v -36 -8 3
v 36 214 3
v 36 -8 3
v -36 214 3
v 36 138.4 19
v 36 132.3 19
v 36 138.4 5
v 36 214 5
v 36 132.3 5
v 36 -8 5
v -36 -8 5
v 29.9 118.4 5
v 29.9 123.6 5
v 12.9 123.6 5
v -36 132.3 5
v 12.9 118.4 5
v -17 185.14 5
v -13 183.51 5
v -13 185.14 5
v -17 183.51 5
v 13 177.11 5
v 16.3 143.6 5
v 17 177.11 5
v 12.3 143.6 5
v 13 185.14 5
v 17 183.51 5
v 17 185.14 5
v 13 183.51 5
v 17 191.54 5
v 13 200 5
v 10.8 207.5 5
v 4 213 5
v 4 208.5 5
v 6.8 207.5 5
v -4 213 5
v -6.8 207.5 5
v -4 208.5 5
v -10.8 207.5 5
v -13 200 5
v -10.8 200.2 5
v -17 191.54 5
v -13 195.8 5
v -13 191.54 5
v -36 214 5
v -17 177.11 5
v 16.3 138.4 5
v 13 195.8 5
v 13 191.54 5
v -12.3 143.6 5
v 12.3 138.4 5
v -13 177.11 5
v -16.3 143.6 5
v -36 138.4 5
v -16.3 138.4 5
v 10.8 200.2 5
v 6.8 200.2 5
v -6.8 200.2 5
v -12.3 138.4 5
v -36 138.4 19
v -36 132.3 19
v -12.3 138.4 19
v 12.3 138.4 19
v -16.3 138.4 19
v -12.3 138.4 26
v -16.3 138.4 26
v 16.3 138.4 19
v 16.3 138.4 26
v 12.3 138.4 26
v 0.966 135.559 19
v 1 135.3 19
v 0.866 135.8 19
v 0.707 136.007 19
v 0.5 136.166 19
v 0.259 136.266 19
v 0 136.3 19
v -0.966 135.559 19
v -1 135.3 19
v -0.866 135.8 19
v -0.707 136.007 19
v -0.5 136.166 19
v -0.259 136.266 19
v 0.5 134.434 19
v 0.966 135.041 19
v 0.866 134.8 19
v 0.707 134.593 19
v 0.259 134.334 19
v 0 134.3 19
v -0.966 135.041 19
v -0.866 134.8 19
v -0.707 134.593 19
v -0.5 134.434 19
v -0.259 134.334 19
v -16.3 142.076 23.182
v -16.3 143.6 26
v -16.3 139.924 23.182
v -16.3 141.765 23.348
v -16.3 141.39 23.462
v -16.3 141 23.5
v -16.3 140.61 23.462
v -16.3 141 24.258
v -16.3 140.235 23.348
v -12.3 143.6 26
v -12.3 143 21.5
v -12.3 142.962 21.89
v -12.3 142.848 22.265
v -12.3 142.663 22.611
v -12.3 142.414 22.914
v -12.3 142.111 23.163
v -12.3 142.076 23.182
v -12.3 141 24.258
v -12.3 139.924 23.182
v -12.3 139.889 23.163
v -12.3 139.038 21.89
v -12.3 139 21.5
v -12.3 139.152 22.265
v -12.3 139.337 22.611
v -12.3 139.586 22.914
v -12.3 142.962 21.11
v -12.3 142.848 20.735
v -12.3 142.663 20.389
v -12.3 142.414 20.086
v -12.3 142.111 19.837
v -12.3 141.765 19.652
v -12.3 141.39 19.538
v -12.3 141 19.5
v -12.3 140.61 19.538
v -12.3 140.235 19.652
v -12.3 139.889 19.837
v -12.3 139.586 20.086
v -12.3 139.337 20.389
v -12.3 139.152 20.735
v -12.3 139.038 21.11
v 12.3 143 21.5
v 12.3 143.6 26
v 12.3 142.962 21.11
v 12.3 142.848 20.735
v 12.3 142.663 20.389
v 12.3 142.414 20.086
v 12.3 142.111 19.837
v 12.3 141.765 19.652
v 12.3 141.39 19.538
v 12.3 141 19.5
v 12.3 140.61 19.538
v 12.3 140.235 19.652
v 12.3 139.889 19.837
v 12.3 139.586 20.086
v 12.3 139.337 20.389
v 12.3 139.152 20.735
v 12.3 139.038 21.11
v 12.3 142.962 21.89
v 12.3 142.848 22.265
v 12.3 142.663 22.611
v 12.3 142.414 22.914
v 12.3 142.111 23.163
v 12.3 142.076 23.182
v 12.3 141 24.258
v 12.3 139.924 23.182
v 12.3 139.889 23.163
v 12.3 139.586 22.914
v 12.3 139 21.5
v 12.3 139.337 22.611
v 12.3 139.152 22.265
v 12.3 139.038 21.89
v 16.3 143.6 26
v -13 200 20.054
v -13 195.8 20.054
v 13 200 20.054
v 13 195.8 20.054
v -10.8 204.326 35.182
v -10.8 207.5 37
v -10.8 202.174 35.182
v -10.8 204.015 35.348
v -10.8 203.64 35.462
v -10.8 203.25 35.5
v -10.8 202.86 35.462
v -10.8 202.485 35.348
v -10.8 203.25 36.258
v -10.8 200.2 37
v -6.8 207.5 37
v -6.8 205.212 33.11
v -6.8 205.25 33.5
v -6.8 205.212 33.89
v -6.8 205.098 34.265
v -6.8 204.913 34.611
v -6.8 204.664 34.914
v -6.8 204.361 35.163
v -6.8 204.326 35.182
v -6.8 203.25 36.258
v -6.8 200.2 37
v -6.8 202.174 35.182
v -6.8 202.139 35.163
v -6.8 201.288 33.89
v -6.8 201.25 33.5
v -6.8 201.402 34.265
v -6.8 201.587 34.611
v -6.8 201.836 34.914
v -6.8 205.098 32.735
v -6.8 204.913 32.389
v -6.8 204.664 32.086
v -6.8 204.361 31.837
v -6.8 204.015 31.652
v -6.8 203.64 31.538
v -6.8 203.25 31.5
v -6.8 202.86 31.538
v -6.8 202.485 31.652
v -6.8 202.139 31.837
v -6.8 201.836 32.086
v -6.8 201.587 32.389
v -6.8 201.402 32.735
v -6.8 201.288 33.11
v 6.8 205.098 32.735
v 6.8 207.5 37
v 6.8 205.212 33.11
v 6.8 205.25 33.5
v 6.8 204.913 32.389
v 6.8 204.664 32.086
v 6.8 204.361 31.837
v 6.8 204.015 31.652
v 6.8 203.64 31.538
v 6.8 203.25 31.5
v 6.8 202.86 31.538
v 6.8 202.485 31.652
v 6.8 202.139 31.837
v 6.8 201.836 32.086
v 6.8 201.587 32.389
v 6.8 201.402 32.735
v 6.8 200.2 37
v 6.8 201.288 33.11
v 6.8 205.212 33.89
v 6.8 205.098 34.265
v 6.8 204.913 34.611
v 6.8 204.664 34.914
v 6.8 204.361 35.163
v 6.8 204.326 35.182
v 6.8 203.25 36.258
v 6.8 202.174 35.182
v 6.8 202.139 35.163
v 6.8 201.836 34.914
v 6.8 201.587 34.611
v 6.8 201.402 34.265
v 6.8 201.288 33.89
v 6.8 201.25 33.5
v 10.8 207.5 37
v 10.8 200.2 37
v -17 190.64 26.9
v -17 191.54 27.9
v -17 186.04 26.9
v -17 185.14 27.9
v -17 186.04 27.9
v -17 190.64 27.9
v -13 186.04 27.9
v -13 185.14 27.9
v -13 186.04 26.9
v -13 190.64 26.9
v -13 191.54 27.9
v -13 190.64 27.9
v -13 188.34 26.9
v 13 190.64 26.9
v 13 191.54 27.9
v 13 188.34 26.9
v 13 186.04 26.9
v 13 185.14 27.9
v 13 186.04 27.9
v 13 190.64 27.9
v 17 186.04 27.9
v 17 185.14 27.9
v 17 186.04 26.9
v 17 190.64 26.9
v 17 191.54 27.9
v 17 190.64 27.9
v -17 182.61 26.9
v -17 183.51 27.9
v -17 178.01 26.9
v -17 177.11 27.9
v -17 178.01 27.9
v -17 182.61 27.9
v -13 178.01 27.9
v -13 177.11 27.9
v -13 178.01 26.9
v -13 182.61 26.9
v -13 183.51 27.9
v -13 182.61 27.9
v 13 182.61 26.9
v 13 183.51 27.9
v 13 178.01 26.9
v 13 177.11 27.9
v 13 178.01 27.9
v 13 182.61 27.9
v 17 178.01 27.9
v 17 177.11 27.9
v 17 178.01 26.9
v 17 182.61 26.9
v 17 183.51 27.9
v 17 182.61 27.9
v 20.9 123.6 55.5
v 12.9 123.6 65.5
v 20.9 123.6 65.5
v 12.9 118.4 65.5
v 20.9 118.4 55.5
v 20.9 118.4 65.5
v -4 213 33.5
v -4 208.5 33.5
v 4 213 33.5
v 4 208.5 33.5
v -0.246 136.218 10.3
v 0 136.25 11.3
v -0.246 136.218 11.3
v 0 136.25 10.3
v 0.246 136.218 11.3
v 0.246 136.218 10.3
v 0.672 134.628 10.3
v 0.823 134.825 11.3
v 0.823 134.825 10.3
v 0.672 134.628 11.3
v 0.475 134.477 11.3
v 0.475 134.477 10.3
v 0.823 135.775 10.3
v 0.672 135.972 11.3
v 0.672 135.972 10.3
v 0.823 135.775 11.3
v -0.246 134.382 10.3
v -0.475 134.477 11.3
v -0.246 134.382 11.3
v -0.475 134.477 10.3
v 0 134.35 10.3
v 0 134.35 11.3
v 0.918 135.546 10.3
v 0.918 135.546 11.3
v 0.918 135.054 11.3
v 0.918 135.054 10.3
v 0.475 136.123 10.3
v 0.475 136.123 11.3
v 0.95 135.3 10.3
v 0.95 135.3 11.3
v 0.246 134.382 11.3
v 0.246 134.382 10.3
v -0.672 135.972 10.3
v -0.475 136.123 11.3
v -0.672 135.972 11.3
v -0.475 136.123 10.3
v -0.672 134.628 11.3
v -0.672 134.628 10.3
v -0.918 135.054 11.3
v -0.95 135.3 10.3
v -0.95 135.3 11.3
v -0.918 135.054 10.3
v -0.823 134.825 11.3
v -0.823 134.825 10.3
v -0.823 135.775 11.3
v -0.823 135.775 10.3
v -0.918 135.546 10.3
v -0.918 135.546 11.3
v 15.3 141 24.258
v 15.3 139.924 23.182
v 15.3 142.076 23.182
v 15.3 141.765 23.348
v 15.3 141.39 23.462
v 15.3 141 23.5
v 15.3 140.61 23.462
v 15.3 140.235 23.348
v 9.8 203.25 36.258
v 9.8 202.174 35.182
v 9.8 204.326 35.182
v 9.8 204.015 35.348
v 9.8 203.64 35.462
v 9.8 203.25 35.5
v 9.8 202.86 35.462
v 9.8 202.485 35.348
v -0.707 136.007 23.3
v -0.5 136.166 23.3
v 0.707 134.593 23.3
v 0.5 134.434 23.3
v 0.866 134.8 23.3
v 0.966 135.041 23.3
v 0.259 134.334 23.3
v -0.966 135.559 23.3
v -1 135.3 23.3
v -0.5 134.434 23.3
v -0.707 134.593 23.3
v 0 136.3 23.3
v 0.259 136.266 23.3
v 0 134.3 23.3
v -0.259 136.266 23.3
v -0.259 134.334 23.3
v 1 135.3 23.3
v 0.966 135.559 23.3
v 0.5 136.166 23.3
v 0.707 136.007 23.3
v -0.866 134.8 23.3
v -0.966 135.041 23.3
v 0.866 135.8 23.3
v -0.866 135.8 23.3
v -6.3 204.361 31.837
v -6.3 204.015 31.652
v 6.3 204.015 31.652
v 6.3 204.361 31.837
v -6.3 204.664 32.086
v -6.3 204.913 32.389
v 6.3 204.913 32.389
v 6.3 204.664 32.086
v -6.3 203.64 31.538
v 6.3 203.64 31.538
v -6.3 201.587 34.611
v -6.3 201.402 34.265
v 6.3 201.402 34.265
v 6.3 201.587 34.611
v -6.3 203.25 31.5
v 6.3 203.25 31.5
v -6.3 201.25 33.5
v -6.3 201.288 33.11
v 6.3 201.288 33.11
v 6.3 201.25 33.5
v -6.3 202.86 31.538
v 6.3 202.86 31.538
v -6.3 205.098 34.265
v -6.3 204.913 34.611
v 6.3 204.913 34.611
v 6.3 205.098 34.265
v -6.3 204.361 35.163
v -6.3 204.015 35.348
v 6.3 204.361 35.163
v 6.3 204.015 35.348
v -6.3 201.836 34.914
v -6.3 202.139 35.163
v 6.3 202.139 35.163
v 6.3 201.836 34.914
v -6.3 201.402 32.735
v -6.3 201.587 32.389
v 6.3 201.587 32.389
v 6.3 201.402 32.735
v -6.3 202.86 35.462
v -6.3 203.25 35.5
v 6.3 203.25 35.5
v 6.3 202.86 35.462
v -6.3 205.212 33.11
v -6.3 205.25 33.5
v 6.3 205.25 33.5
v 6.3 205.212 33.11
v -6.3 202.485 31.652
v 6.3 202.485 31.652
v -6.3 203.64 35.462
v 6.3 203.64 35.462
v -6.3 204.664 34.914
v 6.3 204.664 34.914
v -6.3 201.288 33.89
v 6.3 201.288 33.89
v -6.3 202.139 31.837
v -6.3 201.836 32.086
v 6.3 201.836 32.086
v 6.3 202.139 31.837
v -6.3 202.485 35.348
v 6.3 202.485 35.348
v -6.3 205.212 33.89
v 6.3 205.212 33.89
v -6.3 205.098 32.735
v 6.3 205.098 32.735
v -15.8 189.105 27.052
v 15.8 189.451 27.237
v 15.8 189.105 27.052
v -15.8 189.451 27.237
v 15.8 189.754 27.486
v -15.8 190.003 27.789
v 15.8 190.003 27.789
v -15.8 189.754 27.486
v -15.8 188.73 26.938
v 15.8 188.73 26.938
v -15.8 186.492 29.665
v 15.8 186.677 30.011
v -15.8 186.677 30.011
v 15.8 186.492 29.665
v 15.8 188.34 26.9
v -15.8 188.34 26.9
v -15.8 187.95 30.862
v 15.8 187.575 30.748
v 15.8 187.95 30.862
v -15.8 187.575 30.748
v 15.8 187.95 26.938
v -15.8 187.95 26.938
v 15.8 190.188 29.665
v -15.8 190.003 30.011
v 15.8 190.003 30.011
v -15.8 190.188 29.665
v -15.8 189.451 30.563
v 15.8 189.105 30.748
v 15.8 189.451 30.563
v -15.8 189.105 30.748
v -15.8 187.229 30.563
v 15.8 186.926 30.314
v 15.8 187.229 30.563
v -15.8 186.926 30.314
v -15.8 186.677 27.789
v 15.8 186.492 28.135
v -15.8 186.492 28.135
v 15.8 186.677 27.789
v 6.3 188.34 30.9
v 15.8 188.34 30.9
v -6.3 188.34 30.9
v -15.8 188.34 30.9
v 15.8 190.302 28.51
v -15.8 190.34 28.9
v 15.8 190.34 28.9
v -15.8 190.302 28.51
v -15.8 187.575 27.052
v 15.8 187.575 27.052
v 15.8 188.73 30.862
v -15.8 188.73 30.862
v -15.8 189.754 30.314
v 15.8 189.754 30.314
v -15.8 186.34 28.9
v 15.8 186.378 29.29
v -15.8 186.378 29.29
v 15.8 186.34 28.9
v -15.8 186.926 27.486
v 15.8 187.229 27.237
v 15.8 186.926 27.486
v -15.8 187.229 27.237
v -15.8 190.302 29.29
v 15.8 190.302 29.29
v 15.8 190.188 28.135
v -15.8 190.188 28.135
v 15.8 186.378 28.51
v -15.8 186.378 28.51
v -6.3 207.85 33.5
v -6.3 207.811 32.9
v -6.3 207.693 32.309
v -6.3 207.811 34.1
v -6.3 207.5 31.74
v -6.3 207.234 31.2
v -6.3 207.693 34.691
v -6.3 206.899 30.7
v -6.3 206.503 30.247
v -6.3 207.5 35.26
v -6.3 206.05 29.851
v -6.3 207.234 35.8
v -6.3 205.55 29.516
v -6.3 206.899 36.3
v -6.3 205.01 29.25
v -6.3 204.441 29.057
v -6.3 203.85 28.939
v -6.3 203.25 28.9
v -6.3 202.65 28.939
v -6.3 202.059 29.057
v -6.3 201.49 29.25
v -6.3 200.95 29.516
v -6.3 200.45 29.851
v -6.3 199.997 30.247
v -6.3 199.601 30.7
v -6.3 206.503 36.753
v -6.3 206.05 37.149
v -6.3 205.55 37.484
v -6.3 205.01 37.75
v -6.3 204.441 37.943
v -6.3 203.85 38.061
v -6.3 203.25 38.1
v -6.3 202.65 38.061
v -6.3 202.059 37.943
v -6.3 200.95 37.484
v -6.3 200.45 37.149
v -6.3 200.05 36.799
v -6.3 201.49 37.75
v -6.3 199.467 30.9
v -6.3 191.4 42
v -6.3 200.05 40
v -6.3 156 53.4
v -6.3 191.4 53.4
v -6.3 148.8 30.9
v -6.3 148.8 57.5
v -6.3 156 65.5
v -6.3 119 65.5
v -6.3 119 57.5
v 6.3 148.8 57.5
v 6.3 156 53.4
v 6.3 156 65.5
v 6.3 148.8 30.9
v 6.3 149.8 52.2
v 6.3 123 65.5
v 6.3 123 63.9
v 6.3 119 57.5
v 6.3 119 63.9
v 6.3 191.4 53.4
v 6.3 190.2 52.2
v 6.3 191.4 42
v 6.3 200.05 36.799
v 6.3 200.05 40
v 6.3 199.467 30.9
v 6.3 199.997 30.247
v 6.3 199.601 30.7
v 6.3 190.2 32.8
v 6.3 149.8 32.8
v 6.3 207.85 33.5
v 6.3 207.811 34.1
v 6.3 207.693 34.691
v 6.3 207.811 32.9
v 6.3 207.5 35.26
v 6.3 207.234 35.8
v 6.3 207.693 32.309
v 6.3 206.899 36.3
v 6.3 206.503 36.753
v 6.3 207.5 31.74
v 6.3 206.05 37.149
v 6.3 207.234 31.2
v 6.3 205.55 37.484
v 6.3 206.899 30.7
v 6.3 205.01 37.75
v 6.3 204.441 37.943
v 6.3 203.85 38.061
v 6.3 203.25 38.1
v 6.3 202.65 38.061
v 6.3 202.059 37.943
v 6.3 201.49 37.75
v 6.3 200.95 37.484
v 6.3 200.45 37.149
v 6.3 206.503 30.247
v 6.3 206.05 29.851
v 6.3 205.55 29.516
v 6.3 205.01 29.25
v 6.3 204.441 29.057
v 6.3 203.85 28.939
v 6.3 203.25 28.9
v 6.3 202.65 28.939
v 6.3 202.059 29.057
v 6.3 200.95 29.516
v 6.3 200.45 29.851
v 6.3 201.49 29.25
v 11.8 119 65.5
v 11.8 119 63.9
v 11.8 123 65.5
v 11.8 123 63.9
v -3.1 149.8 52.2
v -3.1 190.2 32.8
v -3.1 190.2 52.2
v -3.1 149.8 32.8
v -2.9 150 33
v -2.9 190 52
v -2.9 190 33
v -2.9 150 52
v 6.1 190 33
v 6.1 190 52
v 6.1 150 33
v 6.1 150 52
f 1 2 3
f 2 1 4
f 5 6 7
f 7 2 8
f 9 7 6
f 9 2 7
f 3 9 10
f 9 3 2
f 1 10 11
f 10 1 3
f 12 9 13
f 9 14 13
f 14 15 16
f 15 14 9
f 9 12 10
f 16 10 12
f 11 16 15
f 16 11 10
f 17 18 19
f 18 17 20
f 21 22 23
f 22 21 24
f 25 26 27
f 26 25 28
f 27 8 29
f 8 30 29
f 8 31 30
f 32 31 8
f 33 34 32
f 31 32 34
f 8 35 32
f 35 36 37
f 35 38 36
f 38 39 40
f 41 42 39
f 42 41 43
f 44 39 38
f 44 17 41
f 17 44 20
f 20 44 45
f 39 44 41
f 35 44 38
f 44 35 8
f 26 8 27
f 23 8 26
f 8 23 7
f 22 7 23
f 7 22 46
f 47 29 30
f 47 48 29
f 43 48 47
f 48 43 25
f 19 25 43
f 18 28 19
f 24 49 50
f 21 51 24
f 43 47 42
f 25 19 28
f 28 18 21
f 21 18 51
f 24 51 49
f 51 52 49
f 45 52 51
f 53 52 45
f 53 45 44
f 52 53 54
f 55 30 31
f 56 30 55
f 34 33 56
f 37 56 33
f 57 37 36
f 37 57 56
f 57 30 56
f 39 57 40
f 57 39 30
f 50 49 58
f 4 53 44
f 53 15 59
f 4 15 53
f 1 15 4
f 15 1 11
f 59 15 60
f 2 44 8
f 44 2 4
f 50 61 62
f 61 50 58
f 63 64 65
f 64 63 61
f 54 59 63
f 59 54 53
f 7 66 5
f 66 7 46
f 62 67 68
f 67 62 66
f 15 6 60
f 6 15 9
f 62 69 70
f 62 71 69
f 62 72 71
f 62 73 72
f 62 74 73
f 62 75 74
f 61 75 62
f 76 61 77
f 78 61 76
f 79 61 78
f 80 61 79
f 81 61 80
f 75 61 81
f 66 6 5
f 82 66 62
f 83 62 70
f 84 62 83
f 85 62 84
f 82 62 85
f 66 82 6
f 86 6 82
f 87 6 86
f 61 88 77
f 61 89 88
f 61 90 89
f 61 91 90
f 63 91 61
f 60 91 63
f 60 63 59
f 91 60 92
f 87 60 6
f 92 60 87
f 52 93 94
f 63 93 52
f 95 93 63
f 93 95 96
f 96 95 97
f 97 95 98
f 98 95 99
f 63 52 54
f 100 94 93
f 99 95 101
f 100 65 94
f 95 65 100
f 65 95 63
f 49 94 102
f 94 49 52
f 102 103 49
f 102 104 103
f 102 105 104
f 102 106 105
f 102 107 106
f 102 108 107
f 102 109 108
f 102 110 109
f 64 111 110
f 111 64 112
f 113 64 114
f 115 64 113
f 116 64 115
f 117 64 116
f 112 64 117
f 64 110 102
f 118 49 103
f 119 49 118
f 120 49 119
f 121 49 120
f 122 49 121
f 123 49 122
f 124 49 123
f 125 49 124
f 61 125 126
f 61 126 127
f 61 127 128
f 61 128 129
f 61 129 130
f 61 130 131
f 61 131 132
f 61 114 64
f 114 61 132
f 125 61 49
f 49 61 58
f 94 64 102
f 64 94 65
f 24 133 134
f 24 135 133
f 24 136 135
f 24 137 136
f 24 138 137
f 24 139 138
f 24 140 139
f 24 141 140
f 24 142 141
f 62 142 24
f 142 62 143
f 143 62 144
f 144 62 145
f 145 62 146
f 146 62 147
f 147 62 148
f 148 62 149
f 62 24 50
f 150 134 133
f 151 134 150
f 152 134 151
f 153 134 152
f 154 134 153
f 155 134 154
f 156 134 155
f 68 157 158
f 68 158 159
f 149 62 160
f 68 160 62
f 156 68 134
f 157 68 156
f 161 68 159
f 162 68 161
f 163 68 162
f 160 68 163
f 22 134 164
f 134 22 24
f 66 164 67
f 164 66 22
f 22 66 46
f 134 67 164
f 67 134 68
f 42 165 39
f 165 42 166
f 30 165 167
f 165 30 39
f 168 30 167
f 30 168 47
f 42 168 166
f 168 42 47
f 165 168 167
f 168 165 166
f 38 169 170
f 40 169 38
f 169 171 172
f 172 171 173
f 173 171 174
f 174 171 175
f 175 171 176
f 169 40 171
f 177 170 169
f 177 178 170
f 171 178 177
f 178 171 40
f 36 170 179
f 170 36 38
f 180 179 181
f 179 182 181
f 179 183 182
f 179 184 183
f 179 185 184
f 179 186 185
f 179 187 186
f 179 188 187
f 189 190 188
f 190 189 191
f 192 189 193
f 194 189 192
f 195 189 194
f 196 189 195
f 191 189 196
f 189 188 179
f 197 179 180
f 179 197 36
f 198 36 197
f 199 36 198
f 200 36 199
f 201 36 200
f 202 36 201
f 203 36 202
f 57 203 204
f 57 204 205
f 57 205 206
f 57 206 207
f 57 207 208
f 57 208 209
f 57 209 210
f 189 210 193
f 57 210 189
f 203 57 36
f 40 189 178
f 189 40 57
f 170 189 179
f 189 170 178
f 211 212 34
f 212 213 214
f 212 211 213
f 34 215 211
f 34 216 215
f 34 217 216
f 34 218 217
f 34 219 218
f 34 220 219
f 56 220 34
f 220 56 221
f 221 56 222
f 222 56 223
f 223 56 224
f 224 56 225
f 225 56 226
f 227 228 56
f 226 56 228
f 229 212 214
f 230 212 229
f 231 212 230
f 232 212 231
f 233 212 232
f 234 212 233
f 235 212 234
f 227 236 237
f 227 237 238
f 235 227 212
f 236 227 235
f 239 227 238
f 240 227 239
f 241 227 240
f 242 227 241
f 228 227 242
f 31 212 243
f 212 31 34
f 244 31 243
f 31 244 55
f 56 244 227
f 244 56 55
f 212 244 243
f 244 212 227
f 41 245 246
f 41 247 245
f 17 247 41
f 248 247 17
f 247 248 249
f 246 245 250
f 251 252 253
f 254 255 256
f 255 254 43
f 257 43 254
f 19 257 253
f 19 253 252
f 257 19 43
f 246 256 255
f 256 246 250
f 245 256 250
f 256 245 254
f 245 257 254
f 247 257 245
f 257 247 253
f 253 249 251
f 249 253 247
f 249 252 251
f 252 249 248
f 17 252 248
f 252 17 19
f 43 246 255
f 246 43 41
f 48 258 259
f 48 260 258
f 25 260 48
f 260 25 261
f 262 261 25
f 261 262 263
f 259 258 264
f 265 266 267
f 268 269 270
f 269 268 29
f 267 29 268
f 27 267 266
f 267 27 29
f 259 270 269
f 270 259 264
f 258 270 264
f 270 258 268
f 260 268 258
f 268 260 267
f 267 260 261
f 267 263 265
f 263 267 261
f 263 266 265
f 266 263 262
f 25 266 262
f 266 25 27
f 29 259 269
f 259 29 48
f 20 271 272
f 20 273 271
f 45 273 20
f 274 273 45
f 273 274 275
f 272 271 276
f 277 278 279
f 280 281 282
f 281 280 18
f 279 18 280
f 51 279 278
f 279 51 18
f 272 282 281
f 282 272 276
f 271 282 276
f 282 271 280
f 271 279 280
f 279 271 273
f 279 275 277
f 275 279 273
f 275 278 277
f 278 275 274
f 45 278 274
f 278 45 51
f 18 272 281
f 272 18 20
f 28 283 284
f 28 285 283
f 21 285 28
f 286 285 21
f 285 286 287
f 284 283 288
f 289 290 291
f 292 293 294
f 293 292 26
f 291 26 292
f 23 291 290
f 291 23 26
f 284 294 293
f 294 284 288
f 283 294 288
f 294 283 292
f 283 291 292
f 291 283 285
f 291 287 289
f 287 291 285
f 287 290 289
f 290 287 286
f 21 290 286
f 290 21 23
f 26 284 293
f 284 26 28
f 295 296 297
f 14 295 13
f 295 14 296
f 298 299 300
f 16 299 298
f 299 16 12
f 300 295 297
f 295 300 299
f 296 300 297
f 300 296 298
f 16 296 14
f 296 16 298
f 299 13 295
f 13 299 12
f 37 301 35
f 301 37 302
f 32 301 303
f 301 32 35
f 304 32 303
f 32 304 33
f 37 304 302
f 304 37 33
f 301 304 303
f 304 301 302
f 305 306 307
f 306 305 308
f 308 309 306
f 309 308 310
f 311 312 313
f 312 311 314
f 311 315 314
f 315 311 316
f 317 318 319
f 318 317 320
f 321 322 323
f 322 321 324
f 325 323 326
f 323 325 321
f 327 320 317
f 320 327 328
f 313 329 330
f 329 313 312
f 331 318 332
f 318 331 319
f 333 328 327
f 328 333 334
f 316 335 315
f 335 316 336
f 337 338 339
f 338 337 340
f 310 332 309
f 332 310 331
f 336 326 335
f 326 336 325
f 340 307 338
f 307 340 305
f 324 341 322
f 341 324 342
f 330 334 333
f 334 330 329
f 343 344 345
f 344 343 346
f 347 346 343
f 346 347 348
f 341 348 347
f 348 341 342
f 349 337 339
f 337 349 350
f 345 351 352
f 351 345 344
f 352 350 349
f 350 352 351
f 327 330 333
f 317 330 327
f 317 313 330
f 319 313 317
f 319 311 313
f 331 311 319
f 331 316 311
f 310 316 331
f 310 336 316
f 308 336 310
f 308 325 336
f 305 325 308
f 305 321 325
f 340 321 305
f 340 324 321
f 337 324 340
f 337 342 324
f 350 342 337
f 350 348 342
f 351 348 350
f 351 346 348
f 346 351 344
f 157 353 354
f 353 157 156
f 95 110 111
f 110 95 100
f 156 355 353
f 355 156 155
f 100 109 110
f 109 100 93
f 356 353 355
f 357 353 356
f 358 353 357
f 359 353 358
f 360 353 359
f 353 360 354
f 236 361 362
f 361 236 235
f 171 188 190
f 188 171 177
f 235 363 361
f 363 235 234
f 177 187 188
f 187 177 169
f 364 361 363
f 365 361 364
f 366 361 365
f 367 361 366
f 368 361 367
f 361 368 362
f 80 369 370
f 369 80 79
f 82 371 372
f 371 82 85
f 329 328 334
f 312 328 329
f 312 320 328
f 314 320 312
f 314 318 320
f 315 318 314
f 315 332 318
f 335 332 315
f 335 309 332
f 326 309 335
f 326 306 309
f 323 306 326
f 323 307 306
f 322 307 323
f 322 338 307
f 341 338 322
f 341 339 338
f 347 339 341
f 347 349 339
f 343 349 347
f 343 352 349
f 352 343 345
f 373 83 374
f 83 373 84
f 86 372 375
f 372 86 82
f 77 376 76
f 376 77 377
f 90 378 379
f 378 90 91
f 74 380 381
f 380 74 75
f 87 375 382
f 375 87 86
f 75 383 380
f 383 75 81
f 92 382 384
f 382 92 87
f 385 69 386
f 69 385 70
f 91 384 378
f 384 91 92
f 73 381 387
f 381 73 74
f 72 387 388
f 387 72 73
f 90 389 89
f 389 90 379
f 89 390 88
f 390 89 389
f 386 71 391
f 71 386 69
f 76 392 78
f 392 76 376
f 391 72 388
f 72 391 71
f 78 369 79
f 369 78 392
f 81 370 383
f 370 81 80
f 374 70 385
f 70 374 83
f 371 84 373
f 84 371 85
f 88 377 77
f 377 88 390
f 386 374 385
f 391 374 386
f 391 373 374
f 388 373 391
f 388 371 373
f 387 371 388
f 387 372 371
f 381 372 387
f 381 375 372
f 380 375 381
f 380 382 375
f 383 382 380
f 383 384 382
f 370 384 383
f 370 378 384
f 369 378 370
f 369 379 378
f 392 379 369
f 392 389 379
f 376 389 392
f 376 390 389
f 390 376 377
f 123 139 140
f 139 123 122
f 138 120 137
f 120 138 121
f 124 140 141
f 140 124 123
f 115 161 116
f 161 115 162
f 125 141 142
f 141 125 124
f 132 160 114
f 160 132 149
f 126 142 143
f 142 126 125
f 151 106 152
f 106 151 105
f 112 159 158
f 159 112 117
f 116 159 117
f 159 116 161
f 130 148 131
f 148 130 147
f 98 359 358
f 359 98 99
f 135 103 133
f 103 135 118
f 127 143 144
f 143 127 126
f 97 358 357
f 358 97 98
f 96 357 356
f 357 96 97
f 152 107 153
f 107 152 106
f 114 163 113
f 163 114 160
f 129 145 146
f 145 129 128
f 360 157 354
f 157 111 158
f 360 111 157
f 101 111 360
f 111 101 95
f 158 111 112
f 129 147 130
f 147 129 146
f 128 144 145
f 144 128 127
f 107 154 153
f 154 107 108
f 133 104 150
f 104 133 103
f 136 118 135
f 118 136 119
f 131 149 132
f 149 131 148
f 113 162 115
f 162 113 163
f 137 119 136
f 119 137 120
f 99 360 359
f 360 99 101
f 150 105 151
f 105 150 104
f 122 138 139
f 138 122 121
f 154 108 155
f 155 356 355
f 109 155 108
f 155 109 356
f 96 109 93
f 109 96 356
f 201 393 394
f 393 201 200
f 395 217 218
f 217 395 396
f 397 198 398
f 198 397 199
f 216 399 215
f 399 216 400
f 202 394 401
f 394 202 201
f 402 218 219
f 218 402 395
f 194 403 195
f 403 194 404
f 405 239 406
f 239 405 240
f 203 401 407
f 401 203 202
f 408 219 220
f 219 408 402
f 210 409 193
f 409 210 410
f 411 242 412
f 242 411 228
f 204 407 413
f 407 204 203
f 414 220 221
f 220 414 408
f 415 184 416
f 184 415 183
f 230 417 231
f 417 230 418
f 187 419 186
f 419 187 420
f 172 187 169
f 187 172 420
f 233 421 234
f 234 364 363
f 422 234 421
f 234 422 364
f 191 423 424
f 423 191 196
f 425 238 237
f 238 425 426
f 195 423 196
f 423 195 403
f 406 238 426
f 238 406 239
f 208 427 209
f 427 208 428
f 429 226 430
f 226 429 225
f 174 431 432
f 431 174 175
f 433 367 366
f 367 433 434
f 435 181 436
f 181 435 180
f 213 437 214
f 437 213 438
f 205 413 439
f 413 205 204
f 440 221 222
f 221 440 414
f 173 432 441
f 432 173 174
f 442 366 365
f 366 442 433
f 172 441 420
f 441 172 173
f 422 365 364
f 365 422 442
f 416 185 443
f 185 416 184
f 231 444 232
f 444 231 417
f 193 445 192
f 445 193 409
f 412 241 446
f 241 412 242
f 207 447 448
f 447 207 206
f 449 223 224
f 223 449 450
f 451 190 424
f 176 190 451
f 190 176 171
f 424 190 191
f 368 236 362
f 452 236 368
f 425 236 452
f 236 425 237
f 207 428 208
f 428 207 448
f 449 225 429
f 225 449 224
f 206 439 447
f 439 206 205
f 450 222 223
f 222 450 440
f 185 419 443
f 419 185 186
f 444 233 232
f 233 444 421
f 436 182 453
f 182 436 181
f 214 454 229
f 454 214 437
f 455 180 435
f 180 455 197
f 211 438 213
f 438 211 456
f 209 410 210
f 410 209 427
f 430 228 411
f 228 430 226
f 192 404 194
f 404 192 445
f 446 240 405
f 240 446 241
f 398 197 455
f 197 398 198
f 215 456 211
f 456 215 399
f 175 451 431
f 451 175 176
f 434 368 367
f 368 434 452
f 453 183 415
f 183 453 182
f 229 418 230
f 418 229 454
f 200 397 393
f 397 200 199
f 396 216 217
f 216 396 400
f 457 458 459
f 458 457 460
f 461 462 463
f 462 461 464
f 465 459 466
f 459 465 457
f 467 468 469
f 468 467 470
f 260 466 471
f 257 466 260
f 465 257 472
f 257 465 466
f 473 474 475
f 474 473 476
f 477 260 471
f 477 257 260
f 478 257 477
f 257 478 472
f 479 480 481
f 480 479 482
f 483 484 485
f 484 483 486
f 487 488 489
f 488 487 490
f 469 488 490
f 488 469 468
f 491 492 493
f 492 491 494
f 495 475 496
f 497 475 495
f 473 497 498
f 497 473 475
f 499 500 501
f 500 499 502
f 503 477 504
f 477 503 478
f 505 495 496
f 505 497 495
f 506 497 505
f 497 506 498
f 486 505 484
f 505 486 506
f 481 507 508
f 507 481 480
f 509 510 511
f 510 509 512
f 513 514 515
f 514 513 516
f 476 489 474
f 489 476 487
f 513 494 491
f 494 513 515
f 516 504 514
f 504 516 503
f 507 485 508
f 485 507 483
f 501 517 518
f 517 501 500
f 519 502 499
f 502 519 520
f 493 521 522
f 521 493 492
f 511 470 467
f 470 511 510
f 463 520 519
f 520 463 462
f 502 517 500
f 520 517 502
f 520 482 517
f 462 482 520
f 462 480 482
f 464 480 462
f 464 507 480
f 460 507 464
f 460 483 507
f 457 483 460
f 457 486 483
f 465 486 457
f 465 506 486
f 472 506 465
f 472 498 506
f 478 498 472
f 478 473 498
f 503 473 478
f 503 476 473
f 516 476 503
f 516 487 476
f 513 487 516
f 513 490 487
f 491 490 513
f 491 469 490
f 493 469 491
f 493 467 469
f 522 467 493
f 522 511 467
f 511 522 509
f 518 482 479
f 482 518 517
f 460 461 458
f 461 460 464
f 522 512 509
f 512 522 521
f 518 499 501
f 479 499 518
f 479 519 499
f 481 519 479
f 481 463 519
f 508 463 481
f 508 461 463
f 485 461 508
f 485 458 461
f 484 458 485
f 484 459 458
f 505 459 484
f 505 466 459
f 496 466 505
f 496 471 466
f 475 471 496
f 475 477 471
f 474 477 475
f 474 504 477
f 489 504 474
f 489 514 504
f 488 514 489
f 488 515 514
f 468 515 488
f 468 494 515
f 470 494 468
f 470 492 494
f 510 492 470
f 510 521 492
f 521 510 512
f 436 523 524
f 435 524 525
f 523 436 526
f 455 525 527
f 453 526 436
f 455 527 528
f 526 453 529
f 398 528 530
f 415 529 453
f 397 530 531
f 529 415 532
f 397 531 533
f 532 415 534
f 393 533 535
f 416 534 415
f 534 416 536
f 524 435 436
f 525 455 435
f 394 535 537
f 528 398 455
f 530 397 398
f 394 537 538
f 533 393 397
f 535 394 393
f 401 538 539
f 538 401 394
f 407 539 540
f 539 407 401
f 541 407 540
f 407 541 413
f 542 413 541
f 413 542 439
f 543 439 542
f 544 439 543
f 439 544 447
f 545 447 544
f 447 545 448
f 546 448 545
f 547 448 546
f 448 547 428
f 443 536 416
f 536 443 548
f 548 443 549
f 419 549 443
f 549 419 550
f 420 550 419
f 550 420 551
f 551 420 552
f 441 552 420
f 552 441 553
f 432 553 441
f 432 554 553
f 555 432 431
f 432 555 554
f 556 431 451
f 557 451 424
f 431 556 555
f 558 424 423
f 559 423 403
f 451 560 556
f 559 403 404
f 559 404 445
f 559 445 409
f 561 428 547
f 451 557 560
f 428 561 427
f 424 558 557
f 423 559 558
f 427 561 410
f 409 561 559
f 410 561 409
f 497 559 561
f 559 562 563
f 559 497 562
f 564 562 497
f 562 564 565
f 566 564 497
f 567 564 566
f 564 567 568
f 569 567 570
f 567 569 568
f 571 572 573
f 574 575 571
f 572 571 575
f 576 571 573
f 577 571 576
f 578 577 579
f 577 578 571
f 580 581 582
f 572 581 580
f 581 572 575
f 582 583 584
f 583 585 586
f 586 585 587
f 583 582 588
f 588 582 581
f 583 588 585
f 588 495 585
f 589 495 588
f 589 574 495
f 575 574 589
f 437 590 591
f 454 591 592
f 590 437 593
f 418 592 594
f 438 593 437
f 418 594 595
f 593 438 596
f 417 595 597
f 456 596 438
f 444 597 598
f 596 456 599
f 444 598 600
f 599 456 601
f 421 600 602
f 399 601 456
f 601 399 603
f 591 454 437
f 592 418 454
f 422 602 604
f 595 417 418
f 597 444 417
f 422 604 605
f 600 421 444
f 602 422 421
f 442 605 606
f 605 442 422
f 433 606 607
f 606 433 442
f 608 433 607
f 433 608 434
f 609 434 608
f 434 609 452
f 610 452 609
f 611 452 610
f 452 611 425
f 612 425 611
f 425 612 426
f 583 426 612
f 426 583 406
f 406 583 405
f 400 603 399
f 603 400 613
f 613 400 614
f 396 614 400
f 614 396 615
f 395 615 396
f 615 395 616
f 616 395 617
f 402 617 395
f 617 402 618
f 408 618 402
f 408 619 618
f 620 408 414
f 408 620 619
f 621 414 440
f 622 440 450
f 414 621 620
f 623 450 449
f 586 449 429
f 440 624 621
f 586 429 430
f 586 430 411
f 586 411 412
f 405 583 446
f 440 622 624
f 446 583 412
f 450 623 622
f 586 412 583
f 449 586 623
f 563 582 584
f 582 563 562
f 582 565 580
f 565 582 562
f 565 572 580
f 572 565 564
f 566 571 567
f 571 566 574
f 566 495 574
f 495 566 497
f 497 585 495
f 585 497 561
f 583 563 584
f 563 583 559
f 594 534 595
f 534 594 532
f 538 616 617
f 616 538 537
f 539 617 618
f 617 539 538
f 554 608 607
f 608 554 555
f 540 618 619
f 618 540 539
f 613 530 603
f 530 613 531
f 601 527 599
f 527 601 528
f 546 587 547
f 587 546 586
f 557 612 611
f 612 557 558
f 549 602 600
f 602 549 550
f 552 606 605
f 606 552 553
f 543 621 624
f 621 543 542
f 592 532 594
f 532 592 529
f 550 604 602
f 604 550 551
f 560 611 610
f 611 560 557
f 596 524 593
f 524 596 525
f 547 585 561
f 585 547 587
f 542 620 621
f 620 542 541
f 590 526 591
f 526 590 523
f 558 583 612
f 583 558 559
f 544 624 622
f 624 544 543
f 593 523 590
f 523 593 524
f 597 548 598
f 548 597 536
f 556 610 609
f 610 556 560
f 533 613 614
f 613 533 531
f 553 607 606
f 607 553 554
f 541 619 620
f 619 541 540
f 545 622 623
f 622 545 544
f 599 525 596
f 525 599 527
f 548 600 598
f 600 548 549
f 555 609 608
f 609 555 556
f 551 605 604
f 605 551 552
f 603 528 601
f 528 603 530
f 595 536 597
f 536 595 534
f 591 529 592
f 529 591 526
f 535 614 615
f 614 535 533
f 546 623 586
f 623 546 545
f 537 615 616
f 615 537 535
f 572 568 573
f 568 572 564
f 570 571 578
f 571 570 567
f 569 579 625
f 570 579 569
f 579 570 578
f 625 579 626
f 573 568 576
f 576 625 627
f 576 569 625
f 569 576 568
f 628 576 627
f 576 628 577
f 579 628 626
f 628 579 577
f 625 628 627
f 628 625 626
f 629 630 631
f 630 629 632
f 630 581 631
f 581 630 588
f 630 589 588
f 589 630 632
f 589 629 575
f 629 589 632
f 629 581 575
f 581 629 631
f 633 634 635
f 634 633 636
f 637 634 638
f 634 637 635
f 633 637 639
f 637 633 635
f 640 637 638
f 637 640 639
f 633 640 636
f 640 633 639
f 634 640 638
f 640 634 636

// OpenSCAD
$fn=40;
color("SteelBlue") difference(){ union(){ translate([0,0,3.0000]) linear_extrude(height=2.0000) polygon(points=[[-36.0000,-8.0000],[36.0000,-8.0000],[36.0000,214.0000],[-36.0000,214.0000]]); multmatrix([[0,0,1,-36.0000],[1,0,0,0],[0,1,0,0],[0,0,0,1]]) linear_extrude(height=72.0000) polygon(points=[[132.3000,5.0000],[138.4000,5.0000],[138.4000,19.0000],[132.3000,19.0000]]); multmatrix([[0,0,1,-16.3000],[1,0,0,0],[0,1,0,0],[0,0,0,1]]) linear_extrude(height=4.0000) polygon(points=[[138.4000,5.0000],[143.6000,5.0000],[143.6000,26.0000],[138.4000,26.0000]]); multmatrix([[0,0,1,12.3000],[1,0,0,0],[0,1,0,0],[0,0,0,1]]) linear_extrude(height=4.0000) polygon(points=[[138.4000,5.0000],[143.6000,5.0000],[143.6000,26.0000],[138.4000,26.0000]]); multmatrix([[0,0,1,-13.0000],[1,0,0,0],[0,1,0,0],[0,0,0,1]]) linear_extrude(height=26.0000) polygon(points=[[195.8000,5.0000],[200.0000,5.0000],[200.0000,20.0540],[195.8000,20.0540]]); multmatrix([[0,0,1,-10.8000],[1,0,0,0],[0,1,0,0],[0,0,0,1]]) linear_extrude(height=4.0000) polygon(points=[[200.2000,5.0000],[207.5000,5.0000],[207.5000,37.0000],[200.2000,37.0000]]); multmatrix([[0,0,1,6.8000],[1,0,0,0],[0,1,0,0],[0,0,0,1]]) linear_extrude(height=4.0000) polygon(points=[[200.2000,5.0000],[207.5000,5.0000],[207.5000,37.0000],[200.2000,37.0000]]); multmatrix([[0,0,1,-17.0000],[1,0,0,0],[0,1,0,0],[0,0,0,1]]) linear_extrude(height=4.0000) polygon(points=[[185.1400,5.0000],[191.5400,5.0000],[191.5400,27.9000],[190.6400,27.9000],[190.6400,26.9000],[186.0400,26.9000],[186.0400,27.9000],[185.1400,27.9000]]); multmatrix([[0,0,1,13.0000],[1,0,0,0],[0,1,0,0],[0,0,0,1]]) linear_extrude(height=4.0000) polygon(points=[[185.1400,5.0000],[191.5400,5.0000],[191.5400,27.9000],[190.6400,27.9000],[190.6400,26.9000],[186.0400,26.9000],[186.0400,27.9000],[185.1400,27.9000]]); multmatrix([[0,0,1,-17.0000],[1,0,0,0],[0,1,0,0],[0,0,0,1]]) linear_extrude(height=4.0000) polygon(points=[[177.1100,5.0000],[183.5100,5.0000],[183.5100,27.9000],[182.6100,27.9000],[182.6100,26.9000],[178.0100,26.9000],[178.0100,27.9000],[177.1100,27.9000]]); multmatrix([[0,0,1,13.0000],[1,0,0,0],[0,1,0,0],[0,0,0,1]]) linear_extrude(height=4.0000) polygon(points=[[177.1100,5.0000],[183.5100,5.0000],[183.5100,27.9000],[182.6100,27.9000],[182.6100,26.9000],[178.0100,26.9000],[178.0100,27.9000],[177.1100,27.9000]]); multmatrix([[1,0,0,0],[0,0,-1,123.6000],[0,1,0,0],[0,0,0,1]]) linear_extrude(height=5.2000) polygon(points=[[12.9000,5.0000],[29.9000,5.0000],[20.9000,55.5000],[20.9000,65.5000],[12.9000,65.5000]]); multmatrix([[0,0,1,-4.0000],[1,0,0,0],[0,1,0,0],[0,0,0,1]]) linear_extrude(height=8.0000) polygon(points=[[208.5000,5.0000],[213.0000,5.0000],[213.0000,33.5000],[208.5000,33.5000]]); } translate([0,0,10.3000]) linear_extrude(height=8.7100) polygon(points=[[0.9500,135.3000],[0.9176,135.5459],[0.8227,135.7750],[0.6718,135.9718],[0.4750,136.1227],[0.2459,136.2176],[0.0000,136.2500],[-0.2459,136.2176],[-0.4750,136.1227],[-0.6718,135.9718],[-0.8227,135.7750],[-0.9176,135.5459],[-0.9500,135.3000],[-0.9176,135.0541],[-0.8227,134.8250],[-0.6718,134.6282],[-0.4750,134.4773],[-0.2459,134.3824],[-0.0000,134.3500],[0.2459,134.3824],[0.4750,134.4773],[0.6718,134.6282],[0.8227,134.8250],[0.9176,135.0541]]); multmatrix([[0,0,1,-16.3100],[1,0,0,0],[0,1,0,0],[0,0,0,1]]) linear_extrude(height=31.6100) polygon(points=[[139.6211,22.8789],[139.4686,22.7072],[139.3374,22.5189],[139.2291,22.3164],[139.1454,22.1026],[139.0875,21.8804],[139.0560,21.6530],[139.0515,21.4234],[139.0740,21.1950],[139.1232,20.9707],[139.1984,20.7538],[139.2986,20.5472],[139.4224,20.3538],[139.5681,20.1763],[139.7336,20.0172],[139.9166,19.8786],[140.1147,19.7625],[140.3251,19.6705],[140.5448,19.6039],[140.7708,19.5635],[141.0000,19.5500],[141.2292,19.5635],[141.4552,19.6039],[141.6749,19.6705],[141.8853,19.7625],[142.0834,19.8786],[142.2664,20.0172],[142.4319,20.1763],[142.5776,20.3538],[142.7014,20.5472],[142.8016,20.7538],[142.8768,20.9707],[142.9260,21.1950],[142.9485,21.4234],[142.9440,21.6530],[142.9125,21.8804],[142.8546,22.1026],[142.7709,22.3164],[142.6626,22.5189],[142.5314,22.7072],[142.3789,22.8789],[141.0000,24.2577]]); multmatrix([[0,0,1,-10.8100],[1,0,0,0],[0,1,0,0],[0,0,0,1]]) linear_extrude(height=20.6100) polygon(points=[[201.8711,34.8789],[201.7186,34.7072],[201.5874,34.5189],[201.4791,34.3164],[201.3954,34.1026],[201.3375,33.8804],[201.3060,33.6530],[201.3015,33.4234],[201.3240,33.1950],[201.3732,32.9707],[201.4484,32.7538],[201.5486,32.5472],[201.6724,32.3538],[201.8181,32.1763],[201.9836,32.0172],[202.1666,31.8786],[202.3647,31.7625],[202.5751,31.6705],[202.7948,31.6039],[203.0208,31.5635],[203.2500,31.5500],[203.4792,31.5635],[203.7052,31.6039],[203.9249,31.6705],[204.1353,31.7625],[204.3334,31.8786],[204.5164,32.0172],[204.6819,32.1763],[204.8276,32.3538],[204.9514,32.5472],[205.0516,32.7538],[205.1268,32.9707],[205.1760,33.1950],[205.1985,33.4234],[205.1940,33.6530],[205.1625,33.8804],[205.1046,34.1026],[205.0209,34.3164],[204.9126,34.5189],[204.7814,34.7072],[204.6289,34.8789],[203.2500,36.2577]]); }
color("DimGray") union(){ translate([0,0,11.3000]) linear_extrude(height=12.0000) polygon(points=[[1.0000,135.3000],[0.9659,135.5588],[0.8660,135.8000],[0.7071,136.0071],[0.5000,136.1660],[0.2588,136.2659],[0.0000,136.3000],[-0.2588,136.2659],[-0.5000,136.1660],[-0.7071,136.0071],[-0.8660,135.8000],[-0.9659,135.5588],[-1.0000,135.3000],[-0.9659,135.0412],[-0.8660,134.8000],[-0.7071,134.5929],[-0.5000,134.4340],[-0.2588,134.3341],[-0.0000,134.3000],[0.2588,134.3341],[0.5000,134.4340],[0.7071,134.5929],[0.8660,134.8000],[0.9659,135.0412]]); multmatrix([[0,0,1,-16.3000],[1,0,0,0],[0,1,0,0],[0,0,0,1]]) linear_extrude(height=31.6000) polygon(points=[[143.0000,21.5000],[142.9616,21.8902],[142.8478,22.2654],[142.6629,22.6111],[142.4142,22.9142],[142.1111,23.1629],[141.7654,23.3478],[141.3902,23.4616],[141.0000,23.5000],[140.6098,23.4616],[140.2346,23.3478],[139.8889,23.1629],[139.5858,22.9142],[139.3371,22.6111],[139.1522,22.2654],[139.0384,21.8902],[139.0000,21.5000],[139.0384,21.1098],[139.1522,20.7346],[139.3371,20.3889],[139.5858,20.0858],[139.8889,19.8371],[140.2346,19.6522],[140.6098,19.5384],[141.0000,19.5000],[141.3902,19.5384],[141.7654,19.6522],[142.1111,19.8371],[142.4142,20.0858],[142.6629,20.3889],[142.8478,20.7346],[142.9616,21.1098]]); multmatrix([[0,0,1,-10.8000],[1,0,0,0],[0,1,0,0],[0,0,0,1]]) linear_extrude(height=20.6000) polygon(points=[[205.2500,33.5000],[205.2116,33.8902],[205.0978,34.2654],[204.9129,34.6111],[204.6642,34.9142],[204.3611,35.1629],[204.0154,35.3478],[203.6402,35.4616],[203.2500,35.5000],[202.8598,35.4616],[202.4846,35.3478],[202.1389,35.1629],[201.8358,34.9142],[201.5871,34.6111],[201.4022,34.2654],[201.2884,33.8902],[201.2500,33.5000],[201.2884,33.1098],[201.4022,32.7346],[201.5871,32.3889],[201.8358,32.0858],[202.1389,31.8371],[202.4846,31.6522],[202.8598,31.5384],[203.2500,31.5000],[203.6402,31.5384],[204.0154,31.6522],[204.3611,31.8371],[204.6642,32.0858],[204.9129,32.3889],[205.0978,32.7346],[205.2116,33.1098]]); multmatrix([[0,0,1,-15.8000],[1,0,0,0],[0,1,0,0],[0,0,0,1]]) linear_extrude(height=31.6000) polygon(points=[[190.3400,28.9000],[190.3016,29.2902],[190.1878,29.6654],[190.0029,30.0111],[189.7542,30.3142],[189.4511,30.5629],[189.1054,30.7478],[188.7302,30.8616],[188.3400,30.9000],[187.9498,30.8616],[187.5746,30.7478],[187.2289,30.5629],[186.9258,30.3142],[186.6771,30.0111],[186.4922,29.6654],[186.3784,29.2902],[186.3400,28.9000],[186.3784,28.5098],[186.4922,28.1346],[186.6771,27.7889],[186.9258,27.4858],[187.2289,27.2371],[187.5746,27.0522],[187.9498,26.9384],[188.3400,26.9000],[188.7302,26.9384],[189.1054,27.0522],[189.4511,27.2371],[189.7542,27.4858],[190.0029,27.7889],[190.1878,28.1346],[190.3016,28.5098]]); }
color("Orange") difference(){ union(){ multmatrix([[0,0,1,-6.3000],[1,0,0,0],[0,1,0,0],[0,0,0,1]]) linear_extrude(height=12.6000) polygon(points=[[148.8000,30.9000],[195.4000,30.9000],[200.0500,30.9000],[200.0500,40.0000],[191.4000,42.0000],[191.4000,53.4000],[148.8000,53.4000]]); multmatrix([[0,0,1,-6.3000],[1,0,0,0],[0,1,0,0],[0,0,0,1]]) linear_extrude(height=12.6000) polygon(points=[[207.8500,33.5000],[207.8106,34.1004],[207.6933,34.6906],[207.4998,35.2603],[207.2337,35.8000],[206.8994,36.3003],[206.5027,36.7527],[206.0503,37.1494],[205.5500,37.4837],[205.0103,37.7498],[204.4406,37.9433],[203.8504,38.0606],[203.2500,38.1000],[202.6496,38.0606],[202.0594,37.9433],[201.4897,37.7498],[200.9500,37.4837],[200.4497,37.1494],[199.9973,36.7527],[199.6006,36.3003],[199.2663,35.8000],[199.0002,35.2603],[198.8067,34.6906],[198.6894,34.1004],[198.6500,33.5000],[198.6894,32.8996],[198.8067,32.3094],[199.0002,31.7397],[199.2663,31.2000],[199.6006,30.6997],[199.9973,30.2473],[200.4497,29.8506],[200.9500,29.5163],[201.4897,29.2502],[202.0594,29.0567],[202.6496,28.9394],[203.2500,28.9000],[203.8504,28.9394],[204.4406,29.0567],[205.0103,29.2502],[205.5500,29.5163],[206.0503,29.8506],[206.5027,30.2473],[206.8994,30.6997],[207.2337,31.2000],[207.4998,31.7397],[207.6933,32.3094],[207.8106,32.8996]]); multmatrix([[0,0,1,-6.3000],[1,0,0,0],[0,1,0,0],[0,0,0,1]]) linear_extrude(height=12.6000) polygon(points=[[119.0000,57.5000],[156.0000,57.5000],[156.0000,65.5000],[119.0000,65.5000]]); multmatrix([[0,0,1,-6.3000],[1,0,0,0],[0,1,0,0],[0,0,0,1]]) linear_extrude(height=12.6000) polygon(points=[[148.8000,53.3900],[156.0000,53.3900],[156.0000,57.5100],[148.8000,57.5100]]); multmatrix([[0,0,1,6.2900],[1,0,0,0],[0,1,0,0],[0,0,0,1]]) linear_extrude(height=5.5100) polygon(points=[[119.0000,63.9000],[123.0000,63.9000],[123.0000,65.5000],[119.0000,65.5000]]); } multmatrix([[0,0,1,-6.3100],[1,0,0,0],[0,1,0,0],[0,0,0,1]]) linear_extrude(height=12.6200) polygon(points=[[205.2000,33.5000],[205.1625,33.8804],[205.0516,34.2462],[204.8714,34.5834],[204.6289,34.8789],[204.3334,35.1214],[203.9962,35.3016],[203.6304,35.4125],[203.2500,35.4500],[202.8696,35.4125],[202.5038,35.3016],[202.1666,35.1214],[201.8711,34.8789],[201.6286,34.5834],[201.4484,34.2462],[201.3375,33.8804],[201.3000,33.5000],[201.3375,33.1196],[201.4484,32.7538],[201.6286,32.4166],[201.8711,32.1211],[202.1666,31.8786],[202.5038,31.6984],[202.8696,31.5875],[203.2500,31.5500],[203.6304,31.5875],[203.9962,31.6984],[204.3334,31.8786],[204.6289,32.1211],[204.8714,32.4166],[205.0516,32.7538],[205.1625,33.1196]]); multmatrix([[0,0,1,-3.1000],[1,0,0,0],[0,1,0,0],[0,0,0,1]]) linear_extrude(height=9.4100) polygon(points=[[149.8000,32.8000],[190.2000,32.8000],[190.2000,52.2000],[149.8000,52.2000]]); }
color("DimGray") union(){ multmatrix([[0,0,1,-2.9000],[1,0,0,0],[0,1,0,0],[0,0,0,1]]) linear_extrude(height=9.0000) polygon(points=[[150.0000,33.0000],[190.0000,33.0000],[190.0000,52.0000],[150.0000,52.0000]]); }
